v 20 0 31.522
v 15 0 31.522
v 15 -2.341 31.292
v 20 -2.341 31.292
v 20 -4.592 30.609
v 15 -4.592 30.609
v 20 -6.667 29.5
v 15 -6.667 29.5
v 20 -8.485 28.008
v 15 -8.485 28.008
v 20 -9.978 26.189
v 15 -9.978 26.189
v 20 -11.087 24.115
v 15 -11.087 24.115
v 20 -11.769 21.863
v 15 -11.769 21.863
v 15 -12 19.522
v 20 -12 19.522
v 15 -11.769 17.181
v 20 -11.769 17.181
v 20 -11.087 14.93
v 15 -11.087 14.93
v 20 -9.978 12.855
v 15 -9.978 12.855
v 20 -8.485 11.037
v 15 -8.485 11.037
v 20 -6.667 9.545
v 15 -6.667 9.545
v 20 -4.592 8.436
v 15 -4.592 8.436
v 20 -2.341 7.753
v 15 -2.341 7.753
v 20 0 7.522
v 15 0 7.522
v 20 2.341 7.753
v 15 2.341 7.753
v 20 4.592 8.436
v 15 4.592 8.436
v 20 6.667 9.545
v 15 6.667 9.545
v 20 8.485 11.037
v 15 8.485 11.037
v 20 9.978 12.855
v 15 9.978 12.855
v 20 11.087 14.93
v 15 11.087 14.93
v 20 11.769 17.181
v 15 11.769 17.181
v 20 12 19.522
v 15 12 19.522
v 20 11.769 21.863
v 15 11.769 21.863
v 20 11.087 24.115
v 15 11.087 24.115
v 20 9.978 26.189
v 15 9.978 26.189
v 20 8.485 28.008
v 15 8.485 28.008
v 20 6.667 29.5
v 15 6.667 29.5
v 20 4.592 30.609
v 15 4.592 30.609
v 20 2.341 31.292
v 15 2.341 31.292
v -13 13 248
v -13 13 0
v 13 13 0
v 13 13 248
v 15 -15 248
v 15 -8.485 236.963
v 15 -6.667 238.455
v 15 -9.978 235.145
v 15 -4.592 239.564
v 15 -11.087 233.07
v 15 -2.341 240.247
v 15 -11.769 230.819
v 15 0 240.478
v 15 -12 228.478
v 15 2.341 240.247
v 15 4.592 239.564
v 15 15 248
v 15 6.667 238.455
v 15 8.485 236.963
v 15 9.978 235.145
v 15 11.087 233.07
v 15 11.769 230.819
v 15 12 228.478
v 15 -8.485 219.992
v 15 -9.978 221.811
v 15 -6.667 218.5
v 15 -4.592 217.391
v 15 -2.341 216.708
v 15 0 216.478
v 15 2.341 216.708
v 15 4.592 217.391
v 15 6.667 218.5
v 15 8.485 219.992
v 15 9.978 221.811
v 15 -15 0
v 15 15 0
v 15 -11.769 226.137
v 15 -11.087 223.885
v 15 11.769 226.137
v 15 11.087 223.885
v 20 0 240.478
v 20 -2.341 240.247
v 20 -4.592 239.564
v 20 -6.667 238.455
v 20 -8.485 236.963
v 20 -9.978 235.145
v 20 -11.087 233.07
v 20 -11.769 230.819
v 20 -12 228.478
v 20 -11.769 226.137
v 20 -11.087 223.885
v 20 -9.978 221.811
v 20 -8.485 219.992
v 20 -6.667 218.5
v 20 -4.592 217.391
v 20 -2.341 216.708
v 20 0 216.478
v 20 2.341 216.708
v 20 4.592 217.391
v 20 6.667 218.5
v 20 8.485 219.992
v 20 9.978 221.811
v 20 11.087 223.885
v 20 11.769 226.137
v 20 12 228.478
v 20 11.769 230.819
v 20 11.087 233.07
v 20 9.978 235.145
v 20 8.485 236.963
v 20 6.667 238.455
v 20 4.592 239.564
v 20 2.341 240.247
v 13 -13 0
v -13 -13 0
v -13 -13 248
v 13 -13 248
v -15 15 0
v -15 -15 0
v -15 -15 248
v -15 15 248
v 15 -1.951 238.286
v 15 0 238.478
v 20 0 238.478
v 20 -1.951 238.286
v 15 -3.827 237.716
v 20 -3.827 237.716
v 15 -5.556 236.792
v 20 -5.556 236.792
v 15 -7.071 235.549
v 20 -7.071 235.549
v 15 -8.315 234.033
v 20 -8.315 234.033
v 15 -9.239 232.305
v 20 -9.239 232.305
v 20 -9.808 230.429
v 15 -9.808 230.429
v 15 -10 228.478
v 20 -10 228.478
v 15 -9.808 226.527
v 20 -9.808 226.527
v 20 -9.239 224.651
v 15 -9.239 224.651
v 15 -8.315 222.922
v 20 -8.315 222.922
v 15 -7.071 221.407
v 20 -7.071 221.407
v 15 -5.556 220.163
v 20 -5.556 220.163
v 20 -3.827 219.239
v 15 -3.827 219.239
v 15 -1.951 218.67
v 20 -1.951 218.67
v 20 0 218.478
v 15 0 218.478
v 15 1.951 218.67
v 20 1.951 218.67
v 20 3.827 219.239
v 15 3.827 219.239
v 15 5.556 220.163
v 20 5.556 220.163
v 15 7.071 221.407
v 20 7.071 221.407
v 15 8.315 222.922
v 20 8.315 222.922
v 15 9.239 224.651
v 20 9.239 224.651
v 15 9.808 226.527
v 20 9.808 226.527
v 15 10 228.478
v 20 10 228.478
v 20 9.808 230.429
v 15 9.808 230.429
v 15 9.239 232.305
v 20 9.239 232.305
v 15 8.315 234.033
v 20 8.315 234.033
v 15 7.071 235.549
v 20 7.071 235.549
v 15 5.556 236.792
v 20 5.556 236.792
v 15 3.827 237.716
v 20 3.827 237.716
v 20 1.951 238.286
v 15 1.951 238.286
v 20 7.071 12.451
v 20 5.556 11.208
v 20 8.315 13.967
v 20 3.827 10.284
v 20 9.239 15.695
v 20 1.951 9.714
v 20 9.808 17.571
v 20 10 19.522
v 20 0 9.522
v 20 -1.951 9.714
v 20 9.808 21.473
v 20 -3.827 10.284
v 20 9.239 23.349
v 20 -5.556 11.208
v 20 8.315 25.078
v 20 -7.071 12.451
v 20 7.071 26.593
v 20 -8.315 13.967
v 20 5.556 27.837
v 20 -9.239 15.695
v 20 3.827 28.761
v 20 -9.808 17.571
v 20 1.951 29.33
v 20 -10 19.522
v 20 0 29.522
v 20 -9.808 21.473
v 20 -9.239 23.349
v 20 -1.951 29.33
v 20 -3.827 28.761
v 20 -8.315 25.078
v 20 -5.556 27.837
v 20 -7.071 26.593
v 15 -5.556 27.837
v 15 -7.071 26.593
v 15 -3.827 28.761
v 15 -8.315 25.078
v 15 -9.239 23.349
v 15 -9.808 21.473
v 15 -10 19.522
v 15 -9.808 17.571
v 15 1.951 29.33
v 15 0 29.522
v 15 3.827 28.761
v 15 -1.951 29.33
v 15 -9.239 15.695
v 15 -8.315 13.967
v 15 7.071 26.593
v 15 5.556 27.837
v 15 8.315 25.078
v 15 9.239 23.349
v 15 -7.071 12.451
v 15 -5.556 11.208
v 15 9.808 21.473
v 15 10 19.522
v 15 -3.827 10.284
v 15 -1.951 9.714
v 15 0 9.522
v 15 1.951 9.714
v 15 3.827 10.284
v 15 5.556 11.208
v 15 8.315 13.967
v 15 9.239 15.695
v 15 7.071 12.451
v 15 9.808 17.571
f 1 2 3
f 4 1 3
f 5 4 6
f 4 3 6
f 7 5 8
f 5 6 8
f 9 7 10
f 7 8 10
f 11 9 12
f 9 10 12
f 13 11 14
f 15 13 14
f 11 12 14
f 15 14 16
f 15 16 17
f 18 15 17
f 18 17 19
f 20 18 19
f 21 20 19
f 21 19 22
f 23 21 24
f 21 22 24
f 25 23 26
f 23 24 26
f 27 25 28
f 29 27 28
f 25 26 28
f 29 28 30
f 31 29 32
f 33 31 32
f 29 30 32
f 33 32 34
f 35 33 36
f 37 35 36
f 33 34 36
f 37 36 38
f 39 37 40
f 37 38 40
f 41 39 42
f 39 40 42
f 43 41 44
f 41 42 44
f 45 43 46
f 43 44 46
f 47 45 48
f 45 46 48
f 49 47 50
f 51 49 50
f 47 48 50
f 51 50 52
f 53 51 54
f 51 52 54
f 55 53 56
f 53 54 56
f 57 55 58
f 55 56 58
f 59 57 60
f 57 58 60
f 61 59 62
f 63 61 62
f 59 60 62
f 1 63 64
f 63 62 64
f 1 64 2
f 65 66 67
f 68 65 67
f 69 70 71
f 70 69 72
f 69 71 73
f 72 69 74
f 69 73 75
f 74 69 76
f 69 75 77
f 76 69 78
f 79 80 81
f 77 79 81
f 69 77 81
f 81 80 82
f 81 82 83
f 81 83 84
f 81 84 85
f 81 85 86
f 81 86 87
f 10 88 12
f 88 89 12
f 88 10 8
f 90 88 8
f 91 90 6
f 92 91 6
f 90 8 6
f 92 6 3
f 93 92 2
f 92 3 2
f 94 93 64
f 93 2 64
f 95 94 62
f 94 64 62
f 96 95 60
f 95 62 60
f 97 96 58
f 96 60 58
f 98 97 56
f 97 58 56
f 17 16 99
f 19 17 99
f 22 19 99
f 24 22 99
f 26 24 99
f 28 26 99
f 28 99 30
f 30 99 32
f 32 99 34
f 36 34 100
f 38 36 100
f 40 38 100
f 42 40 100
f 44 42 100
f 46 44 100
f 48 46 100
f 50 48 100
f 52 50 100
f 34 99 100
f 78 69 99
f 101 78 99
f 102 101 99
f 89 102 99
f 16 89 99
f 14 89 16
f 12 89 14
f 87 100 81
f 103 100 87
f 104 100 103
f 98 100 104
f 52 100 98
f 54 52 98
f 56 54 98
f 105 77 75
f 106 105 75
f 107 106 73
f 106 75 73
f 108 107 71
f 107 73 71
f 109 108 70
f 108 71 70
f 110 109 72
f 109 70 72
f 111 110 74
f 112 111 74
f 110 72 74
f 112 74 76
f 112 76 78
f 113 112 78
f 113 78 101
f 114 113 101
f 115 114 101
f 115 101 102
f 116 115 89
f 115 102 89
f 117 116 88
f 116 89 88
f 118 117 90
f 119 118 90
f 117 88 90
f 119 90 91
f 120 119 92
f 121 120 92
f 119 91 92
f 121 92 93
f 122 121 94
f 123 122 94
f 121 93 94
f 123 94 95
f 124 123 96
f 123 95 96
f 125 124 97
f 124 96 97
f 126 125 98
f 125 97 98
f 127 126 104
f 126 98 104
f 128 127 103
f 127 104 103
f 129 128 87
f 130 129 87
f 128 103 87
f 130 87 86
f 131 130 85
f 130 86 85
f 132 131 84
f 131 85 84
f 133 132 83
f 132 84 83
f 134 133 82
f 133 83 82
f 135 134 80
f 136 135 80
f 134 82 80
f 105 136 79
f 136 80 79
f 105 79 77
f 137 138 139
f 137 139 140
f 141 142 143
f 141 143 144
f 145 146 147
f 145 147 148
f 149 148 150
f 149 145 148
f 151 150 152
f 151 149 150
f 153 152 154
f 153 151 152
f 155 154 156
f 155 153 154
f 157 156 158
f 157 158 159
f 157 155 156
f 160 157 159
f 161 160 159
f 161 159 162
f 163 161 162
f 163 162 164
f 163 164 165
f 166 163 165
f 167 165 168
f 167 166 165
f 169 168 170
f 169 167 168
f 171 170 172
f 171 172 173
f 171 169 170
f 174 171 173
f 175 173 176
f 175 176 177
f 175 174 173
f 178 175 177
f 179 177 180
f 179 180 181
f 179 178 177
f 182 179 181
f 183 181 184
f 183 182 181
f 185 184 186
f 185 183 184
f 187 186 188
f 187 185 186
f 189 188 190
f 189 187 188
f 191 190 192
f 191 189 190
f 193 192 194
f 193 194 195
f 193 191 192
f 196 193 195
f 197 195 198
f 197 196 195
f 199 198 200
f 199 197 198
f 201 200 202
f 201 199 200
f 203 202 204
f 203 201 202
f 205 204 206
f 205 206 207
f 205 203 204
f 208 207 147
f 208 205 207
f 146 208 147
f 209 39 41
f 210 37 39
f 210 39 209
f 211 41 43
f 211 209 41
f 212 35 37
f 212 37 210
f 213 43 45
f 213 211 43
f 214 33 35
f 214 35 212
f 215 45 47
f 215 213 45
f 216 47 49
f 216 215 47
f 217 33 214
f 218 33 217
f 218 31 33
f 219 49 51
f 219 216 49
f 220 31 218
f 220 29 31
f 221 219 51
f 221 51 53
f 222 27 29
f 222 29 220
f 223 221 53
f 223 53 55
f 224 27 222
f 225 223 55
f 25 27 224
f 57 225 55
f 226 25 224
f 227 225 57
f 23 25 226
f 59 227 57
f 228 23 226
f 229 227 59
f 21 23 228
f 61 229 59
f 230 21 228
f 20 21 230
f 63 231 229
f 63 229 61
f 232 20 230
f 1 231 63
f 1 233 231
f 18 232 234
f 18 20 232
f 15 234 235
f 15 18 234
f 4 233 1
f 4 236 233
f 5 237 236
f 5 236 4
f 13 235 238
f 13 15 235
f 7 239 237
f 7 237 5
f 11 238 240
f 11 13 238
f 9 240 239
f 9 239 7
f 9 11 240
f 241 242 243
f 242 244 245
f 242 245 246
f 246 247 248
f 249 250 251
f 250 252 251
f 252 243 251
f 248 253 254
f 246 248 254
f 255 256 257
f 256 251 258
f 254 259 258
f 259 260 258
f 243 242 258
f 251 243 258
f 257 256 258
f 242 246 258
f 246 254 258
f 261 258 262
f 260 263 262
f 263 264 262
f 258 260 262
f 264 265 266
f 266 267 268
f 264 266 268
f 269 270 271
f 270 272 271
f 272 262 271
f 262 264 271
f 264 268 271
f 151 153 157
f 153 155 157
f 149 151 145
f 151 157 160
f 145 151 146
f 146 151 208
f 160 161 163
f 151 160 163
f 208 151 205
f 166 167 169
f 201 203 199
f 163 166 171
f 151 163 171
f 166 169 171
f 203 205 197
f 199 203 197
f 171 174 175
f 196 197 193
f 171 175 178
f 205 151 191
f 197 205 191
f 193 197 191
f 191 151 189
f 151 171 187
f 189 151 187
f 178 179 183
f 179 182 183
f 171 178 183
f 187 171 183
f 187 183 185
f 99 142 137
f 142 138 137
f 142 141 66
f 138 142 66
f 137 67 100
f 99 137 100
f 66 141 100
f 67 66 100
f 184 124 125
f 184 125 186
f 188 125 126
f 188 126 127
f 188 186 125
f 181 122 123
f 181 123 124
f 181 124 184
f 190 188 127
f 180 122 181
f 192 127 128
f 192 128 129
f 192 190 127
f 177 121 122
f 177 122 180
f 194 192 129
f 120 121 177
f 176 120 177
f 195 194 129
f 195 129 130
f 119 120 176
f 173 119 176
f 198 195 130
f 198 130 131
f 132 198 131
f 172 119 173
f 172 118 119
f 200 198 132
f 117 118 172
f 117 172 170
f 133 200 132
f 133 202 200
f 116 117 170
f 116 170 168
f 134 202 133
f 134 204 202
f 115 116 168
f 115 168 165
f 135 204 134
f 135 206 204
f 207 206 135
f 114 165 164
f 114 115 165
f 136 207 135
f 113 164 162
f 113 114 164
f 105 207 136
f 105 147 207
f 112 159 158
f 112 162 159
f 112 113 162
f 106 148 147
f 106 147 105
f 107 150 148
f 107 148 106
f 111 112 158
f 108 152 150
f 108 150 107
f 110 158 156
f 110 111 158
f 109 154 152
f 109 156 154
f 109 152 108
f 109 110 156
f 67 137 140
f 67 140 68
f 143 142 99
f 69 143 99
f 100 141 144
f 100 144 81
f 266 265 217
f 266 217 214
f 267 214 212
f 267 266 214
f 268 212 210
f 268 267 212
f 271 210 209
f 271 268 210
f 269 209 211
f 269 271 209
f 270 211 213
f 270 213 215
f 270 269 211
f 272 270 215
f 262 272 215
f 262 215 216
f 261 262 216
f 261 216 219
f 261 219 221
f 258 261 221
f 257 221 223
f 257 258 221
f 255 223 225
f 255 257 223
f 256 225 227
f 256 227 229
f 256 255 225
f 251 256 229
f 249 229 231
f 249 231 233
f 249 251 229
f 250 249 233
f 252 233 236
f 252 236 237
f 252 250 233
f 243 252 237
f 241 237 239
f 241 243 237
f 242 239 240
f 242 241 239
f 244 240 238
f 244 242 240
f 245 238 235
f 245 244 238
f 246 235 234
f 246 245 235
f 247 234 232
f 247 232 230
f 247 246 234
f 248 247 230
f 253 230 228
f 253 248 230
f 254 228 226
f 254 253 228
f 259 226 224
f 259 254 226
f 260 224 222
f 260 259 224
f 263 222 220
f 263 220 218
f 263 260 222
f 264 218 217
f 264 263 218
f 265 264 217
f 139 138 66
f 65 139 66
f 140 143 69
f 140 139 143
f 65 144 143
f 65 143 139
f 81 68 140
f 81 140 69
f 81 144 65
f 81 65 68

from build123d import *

# Parameters (mm, degrees)
SKETCH1_W           = 30
SKETCH1_H           = 30
SKETCH1_W_2         = 26
SKETCH1_H_2         = 26
BOSS_EXTRUDE1_DEPTH = 248
SKETCH2_R           = 12
SKETCH2_R_2         = 10
BOSS_EXTRUDE2_DEPTH = 5


with BuildPart() as part:
    # Sketch1 → Boss-Extrude1 (new body)
    with BuildSketch(Plane.XY):
        Rectangle(SKETCH1_W, SKETCH1_H)
        Rectangle(SKETCH1_W_2, SKETCH1_H_2, mode=Mode.SUBTRACT)
    extrude(amount=BOSS_EXTRUDE1_DEPTH)

    # Sketch2 → Boss-Extrude2 (add)
    # profile 1 of 2: a face of its own
    with BuildSketch(Plane(origin=(15, 0, 0), x_dir=(0, 0, -1), z_dir=(1, 0, 0))):
        with Locations(Location((-19.522331238, 0, 0), (0, 0, 180))):
            Circle(SKETCH2_R)
        with Locations((-19.522331238, 0)):
            Circle(SKETCH2_R_2, mode=Mode.SUBTRACT)
    # profile 2 of 2: a face of its own
    with BuildSketch(Plane(origin=(15, 0, 0), x_dir=(0, 0, -1), z_dir=(1, 0, 0))):
        with Locations(Location((-228.477668762, 0, 0), (0, 0, 180))):
            Circle(SKETCH2_R)
        with Locations(Location((-228.477668762, 0, 0), (0, 0, 180))):
            Circle(SKETCH2_R_2, mode=Mode.SUBTRACT)
    extrude(amount=BOSS_EXTRUDE2_DEPTH)


solid = part.part
